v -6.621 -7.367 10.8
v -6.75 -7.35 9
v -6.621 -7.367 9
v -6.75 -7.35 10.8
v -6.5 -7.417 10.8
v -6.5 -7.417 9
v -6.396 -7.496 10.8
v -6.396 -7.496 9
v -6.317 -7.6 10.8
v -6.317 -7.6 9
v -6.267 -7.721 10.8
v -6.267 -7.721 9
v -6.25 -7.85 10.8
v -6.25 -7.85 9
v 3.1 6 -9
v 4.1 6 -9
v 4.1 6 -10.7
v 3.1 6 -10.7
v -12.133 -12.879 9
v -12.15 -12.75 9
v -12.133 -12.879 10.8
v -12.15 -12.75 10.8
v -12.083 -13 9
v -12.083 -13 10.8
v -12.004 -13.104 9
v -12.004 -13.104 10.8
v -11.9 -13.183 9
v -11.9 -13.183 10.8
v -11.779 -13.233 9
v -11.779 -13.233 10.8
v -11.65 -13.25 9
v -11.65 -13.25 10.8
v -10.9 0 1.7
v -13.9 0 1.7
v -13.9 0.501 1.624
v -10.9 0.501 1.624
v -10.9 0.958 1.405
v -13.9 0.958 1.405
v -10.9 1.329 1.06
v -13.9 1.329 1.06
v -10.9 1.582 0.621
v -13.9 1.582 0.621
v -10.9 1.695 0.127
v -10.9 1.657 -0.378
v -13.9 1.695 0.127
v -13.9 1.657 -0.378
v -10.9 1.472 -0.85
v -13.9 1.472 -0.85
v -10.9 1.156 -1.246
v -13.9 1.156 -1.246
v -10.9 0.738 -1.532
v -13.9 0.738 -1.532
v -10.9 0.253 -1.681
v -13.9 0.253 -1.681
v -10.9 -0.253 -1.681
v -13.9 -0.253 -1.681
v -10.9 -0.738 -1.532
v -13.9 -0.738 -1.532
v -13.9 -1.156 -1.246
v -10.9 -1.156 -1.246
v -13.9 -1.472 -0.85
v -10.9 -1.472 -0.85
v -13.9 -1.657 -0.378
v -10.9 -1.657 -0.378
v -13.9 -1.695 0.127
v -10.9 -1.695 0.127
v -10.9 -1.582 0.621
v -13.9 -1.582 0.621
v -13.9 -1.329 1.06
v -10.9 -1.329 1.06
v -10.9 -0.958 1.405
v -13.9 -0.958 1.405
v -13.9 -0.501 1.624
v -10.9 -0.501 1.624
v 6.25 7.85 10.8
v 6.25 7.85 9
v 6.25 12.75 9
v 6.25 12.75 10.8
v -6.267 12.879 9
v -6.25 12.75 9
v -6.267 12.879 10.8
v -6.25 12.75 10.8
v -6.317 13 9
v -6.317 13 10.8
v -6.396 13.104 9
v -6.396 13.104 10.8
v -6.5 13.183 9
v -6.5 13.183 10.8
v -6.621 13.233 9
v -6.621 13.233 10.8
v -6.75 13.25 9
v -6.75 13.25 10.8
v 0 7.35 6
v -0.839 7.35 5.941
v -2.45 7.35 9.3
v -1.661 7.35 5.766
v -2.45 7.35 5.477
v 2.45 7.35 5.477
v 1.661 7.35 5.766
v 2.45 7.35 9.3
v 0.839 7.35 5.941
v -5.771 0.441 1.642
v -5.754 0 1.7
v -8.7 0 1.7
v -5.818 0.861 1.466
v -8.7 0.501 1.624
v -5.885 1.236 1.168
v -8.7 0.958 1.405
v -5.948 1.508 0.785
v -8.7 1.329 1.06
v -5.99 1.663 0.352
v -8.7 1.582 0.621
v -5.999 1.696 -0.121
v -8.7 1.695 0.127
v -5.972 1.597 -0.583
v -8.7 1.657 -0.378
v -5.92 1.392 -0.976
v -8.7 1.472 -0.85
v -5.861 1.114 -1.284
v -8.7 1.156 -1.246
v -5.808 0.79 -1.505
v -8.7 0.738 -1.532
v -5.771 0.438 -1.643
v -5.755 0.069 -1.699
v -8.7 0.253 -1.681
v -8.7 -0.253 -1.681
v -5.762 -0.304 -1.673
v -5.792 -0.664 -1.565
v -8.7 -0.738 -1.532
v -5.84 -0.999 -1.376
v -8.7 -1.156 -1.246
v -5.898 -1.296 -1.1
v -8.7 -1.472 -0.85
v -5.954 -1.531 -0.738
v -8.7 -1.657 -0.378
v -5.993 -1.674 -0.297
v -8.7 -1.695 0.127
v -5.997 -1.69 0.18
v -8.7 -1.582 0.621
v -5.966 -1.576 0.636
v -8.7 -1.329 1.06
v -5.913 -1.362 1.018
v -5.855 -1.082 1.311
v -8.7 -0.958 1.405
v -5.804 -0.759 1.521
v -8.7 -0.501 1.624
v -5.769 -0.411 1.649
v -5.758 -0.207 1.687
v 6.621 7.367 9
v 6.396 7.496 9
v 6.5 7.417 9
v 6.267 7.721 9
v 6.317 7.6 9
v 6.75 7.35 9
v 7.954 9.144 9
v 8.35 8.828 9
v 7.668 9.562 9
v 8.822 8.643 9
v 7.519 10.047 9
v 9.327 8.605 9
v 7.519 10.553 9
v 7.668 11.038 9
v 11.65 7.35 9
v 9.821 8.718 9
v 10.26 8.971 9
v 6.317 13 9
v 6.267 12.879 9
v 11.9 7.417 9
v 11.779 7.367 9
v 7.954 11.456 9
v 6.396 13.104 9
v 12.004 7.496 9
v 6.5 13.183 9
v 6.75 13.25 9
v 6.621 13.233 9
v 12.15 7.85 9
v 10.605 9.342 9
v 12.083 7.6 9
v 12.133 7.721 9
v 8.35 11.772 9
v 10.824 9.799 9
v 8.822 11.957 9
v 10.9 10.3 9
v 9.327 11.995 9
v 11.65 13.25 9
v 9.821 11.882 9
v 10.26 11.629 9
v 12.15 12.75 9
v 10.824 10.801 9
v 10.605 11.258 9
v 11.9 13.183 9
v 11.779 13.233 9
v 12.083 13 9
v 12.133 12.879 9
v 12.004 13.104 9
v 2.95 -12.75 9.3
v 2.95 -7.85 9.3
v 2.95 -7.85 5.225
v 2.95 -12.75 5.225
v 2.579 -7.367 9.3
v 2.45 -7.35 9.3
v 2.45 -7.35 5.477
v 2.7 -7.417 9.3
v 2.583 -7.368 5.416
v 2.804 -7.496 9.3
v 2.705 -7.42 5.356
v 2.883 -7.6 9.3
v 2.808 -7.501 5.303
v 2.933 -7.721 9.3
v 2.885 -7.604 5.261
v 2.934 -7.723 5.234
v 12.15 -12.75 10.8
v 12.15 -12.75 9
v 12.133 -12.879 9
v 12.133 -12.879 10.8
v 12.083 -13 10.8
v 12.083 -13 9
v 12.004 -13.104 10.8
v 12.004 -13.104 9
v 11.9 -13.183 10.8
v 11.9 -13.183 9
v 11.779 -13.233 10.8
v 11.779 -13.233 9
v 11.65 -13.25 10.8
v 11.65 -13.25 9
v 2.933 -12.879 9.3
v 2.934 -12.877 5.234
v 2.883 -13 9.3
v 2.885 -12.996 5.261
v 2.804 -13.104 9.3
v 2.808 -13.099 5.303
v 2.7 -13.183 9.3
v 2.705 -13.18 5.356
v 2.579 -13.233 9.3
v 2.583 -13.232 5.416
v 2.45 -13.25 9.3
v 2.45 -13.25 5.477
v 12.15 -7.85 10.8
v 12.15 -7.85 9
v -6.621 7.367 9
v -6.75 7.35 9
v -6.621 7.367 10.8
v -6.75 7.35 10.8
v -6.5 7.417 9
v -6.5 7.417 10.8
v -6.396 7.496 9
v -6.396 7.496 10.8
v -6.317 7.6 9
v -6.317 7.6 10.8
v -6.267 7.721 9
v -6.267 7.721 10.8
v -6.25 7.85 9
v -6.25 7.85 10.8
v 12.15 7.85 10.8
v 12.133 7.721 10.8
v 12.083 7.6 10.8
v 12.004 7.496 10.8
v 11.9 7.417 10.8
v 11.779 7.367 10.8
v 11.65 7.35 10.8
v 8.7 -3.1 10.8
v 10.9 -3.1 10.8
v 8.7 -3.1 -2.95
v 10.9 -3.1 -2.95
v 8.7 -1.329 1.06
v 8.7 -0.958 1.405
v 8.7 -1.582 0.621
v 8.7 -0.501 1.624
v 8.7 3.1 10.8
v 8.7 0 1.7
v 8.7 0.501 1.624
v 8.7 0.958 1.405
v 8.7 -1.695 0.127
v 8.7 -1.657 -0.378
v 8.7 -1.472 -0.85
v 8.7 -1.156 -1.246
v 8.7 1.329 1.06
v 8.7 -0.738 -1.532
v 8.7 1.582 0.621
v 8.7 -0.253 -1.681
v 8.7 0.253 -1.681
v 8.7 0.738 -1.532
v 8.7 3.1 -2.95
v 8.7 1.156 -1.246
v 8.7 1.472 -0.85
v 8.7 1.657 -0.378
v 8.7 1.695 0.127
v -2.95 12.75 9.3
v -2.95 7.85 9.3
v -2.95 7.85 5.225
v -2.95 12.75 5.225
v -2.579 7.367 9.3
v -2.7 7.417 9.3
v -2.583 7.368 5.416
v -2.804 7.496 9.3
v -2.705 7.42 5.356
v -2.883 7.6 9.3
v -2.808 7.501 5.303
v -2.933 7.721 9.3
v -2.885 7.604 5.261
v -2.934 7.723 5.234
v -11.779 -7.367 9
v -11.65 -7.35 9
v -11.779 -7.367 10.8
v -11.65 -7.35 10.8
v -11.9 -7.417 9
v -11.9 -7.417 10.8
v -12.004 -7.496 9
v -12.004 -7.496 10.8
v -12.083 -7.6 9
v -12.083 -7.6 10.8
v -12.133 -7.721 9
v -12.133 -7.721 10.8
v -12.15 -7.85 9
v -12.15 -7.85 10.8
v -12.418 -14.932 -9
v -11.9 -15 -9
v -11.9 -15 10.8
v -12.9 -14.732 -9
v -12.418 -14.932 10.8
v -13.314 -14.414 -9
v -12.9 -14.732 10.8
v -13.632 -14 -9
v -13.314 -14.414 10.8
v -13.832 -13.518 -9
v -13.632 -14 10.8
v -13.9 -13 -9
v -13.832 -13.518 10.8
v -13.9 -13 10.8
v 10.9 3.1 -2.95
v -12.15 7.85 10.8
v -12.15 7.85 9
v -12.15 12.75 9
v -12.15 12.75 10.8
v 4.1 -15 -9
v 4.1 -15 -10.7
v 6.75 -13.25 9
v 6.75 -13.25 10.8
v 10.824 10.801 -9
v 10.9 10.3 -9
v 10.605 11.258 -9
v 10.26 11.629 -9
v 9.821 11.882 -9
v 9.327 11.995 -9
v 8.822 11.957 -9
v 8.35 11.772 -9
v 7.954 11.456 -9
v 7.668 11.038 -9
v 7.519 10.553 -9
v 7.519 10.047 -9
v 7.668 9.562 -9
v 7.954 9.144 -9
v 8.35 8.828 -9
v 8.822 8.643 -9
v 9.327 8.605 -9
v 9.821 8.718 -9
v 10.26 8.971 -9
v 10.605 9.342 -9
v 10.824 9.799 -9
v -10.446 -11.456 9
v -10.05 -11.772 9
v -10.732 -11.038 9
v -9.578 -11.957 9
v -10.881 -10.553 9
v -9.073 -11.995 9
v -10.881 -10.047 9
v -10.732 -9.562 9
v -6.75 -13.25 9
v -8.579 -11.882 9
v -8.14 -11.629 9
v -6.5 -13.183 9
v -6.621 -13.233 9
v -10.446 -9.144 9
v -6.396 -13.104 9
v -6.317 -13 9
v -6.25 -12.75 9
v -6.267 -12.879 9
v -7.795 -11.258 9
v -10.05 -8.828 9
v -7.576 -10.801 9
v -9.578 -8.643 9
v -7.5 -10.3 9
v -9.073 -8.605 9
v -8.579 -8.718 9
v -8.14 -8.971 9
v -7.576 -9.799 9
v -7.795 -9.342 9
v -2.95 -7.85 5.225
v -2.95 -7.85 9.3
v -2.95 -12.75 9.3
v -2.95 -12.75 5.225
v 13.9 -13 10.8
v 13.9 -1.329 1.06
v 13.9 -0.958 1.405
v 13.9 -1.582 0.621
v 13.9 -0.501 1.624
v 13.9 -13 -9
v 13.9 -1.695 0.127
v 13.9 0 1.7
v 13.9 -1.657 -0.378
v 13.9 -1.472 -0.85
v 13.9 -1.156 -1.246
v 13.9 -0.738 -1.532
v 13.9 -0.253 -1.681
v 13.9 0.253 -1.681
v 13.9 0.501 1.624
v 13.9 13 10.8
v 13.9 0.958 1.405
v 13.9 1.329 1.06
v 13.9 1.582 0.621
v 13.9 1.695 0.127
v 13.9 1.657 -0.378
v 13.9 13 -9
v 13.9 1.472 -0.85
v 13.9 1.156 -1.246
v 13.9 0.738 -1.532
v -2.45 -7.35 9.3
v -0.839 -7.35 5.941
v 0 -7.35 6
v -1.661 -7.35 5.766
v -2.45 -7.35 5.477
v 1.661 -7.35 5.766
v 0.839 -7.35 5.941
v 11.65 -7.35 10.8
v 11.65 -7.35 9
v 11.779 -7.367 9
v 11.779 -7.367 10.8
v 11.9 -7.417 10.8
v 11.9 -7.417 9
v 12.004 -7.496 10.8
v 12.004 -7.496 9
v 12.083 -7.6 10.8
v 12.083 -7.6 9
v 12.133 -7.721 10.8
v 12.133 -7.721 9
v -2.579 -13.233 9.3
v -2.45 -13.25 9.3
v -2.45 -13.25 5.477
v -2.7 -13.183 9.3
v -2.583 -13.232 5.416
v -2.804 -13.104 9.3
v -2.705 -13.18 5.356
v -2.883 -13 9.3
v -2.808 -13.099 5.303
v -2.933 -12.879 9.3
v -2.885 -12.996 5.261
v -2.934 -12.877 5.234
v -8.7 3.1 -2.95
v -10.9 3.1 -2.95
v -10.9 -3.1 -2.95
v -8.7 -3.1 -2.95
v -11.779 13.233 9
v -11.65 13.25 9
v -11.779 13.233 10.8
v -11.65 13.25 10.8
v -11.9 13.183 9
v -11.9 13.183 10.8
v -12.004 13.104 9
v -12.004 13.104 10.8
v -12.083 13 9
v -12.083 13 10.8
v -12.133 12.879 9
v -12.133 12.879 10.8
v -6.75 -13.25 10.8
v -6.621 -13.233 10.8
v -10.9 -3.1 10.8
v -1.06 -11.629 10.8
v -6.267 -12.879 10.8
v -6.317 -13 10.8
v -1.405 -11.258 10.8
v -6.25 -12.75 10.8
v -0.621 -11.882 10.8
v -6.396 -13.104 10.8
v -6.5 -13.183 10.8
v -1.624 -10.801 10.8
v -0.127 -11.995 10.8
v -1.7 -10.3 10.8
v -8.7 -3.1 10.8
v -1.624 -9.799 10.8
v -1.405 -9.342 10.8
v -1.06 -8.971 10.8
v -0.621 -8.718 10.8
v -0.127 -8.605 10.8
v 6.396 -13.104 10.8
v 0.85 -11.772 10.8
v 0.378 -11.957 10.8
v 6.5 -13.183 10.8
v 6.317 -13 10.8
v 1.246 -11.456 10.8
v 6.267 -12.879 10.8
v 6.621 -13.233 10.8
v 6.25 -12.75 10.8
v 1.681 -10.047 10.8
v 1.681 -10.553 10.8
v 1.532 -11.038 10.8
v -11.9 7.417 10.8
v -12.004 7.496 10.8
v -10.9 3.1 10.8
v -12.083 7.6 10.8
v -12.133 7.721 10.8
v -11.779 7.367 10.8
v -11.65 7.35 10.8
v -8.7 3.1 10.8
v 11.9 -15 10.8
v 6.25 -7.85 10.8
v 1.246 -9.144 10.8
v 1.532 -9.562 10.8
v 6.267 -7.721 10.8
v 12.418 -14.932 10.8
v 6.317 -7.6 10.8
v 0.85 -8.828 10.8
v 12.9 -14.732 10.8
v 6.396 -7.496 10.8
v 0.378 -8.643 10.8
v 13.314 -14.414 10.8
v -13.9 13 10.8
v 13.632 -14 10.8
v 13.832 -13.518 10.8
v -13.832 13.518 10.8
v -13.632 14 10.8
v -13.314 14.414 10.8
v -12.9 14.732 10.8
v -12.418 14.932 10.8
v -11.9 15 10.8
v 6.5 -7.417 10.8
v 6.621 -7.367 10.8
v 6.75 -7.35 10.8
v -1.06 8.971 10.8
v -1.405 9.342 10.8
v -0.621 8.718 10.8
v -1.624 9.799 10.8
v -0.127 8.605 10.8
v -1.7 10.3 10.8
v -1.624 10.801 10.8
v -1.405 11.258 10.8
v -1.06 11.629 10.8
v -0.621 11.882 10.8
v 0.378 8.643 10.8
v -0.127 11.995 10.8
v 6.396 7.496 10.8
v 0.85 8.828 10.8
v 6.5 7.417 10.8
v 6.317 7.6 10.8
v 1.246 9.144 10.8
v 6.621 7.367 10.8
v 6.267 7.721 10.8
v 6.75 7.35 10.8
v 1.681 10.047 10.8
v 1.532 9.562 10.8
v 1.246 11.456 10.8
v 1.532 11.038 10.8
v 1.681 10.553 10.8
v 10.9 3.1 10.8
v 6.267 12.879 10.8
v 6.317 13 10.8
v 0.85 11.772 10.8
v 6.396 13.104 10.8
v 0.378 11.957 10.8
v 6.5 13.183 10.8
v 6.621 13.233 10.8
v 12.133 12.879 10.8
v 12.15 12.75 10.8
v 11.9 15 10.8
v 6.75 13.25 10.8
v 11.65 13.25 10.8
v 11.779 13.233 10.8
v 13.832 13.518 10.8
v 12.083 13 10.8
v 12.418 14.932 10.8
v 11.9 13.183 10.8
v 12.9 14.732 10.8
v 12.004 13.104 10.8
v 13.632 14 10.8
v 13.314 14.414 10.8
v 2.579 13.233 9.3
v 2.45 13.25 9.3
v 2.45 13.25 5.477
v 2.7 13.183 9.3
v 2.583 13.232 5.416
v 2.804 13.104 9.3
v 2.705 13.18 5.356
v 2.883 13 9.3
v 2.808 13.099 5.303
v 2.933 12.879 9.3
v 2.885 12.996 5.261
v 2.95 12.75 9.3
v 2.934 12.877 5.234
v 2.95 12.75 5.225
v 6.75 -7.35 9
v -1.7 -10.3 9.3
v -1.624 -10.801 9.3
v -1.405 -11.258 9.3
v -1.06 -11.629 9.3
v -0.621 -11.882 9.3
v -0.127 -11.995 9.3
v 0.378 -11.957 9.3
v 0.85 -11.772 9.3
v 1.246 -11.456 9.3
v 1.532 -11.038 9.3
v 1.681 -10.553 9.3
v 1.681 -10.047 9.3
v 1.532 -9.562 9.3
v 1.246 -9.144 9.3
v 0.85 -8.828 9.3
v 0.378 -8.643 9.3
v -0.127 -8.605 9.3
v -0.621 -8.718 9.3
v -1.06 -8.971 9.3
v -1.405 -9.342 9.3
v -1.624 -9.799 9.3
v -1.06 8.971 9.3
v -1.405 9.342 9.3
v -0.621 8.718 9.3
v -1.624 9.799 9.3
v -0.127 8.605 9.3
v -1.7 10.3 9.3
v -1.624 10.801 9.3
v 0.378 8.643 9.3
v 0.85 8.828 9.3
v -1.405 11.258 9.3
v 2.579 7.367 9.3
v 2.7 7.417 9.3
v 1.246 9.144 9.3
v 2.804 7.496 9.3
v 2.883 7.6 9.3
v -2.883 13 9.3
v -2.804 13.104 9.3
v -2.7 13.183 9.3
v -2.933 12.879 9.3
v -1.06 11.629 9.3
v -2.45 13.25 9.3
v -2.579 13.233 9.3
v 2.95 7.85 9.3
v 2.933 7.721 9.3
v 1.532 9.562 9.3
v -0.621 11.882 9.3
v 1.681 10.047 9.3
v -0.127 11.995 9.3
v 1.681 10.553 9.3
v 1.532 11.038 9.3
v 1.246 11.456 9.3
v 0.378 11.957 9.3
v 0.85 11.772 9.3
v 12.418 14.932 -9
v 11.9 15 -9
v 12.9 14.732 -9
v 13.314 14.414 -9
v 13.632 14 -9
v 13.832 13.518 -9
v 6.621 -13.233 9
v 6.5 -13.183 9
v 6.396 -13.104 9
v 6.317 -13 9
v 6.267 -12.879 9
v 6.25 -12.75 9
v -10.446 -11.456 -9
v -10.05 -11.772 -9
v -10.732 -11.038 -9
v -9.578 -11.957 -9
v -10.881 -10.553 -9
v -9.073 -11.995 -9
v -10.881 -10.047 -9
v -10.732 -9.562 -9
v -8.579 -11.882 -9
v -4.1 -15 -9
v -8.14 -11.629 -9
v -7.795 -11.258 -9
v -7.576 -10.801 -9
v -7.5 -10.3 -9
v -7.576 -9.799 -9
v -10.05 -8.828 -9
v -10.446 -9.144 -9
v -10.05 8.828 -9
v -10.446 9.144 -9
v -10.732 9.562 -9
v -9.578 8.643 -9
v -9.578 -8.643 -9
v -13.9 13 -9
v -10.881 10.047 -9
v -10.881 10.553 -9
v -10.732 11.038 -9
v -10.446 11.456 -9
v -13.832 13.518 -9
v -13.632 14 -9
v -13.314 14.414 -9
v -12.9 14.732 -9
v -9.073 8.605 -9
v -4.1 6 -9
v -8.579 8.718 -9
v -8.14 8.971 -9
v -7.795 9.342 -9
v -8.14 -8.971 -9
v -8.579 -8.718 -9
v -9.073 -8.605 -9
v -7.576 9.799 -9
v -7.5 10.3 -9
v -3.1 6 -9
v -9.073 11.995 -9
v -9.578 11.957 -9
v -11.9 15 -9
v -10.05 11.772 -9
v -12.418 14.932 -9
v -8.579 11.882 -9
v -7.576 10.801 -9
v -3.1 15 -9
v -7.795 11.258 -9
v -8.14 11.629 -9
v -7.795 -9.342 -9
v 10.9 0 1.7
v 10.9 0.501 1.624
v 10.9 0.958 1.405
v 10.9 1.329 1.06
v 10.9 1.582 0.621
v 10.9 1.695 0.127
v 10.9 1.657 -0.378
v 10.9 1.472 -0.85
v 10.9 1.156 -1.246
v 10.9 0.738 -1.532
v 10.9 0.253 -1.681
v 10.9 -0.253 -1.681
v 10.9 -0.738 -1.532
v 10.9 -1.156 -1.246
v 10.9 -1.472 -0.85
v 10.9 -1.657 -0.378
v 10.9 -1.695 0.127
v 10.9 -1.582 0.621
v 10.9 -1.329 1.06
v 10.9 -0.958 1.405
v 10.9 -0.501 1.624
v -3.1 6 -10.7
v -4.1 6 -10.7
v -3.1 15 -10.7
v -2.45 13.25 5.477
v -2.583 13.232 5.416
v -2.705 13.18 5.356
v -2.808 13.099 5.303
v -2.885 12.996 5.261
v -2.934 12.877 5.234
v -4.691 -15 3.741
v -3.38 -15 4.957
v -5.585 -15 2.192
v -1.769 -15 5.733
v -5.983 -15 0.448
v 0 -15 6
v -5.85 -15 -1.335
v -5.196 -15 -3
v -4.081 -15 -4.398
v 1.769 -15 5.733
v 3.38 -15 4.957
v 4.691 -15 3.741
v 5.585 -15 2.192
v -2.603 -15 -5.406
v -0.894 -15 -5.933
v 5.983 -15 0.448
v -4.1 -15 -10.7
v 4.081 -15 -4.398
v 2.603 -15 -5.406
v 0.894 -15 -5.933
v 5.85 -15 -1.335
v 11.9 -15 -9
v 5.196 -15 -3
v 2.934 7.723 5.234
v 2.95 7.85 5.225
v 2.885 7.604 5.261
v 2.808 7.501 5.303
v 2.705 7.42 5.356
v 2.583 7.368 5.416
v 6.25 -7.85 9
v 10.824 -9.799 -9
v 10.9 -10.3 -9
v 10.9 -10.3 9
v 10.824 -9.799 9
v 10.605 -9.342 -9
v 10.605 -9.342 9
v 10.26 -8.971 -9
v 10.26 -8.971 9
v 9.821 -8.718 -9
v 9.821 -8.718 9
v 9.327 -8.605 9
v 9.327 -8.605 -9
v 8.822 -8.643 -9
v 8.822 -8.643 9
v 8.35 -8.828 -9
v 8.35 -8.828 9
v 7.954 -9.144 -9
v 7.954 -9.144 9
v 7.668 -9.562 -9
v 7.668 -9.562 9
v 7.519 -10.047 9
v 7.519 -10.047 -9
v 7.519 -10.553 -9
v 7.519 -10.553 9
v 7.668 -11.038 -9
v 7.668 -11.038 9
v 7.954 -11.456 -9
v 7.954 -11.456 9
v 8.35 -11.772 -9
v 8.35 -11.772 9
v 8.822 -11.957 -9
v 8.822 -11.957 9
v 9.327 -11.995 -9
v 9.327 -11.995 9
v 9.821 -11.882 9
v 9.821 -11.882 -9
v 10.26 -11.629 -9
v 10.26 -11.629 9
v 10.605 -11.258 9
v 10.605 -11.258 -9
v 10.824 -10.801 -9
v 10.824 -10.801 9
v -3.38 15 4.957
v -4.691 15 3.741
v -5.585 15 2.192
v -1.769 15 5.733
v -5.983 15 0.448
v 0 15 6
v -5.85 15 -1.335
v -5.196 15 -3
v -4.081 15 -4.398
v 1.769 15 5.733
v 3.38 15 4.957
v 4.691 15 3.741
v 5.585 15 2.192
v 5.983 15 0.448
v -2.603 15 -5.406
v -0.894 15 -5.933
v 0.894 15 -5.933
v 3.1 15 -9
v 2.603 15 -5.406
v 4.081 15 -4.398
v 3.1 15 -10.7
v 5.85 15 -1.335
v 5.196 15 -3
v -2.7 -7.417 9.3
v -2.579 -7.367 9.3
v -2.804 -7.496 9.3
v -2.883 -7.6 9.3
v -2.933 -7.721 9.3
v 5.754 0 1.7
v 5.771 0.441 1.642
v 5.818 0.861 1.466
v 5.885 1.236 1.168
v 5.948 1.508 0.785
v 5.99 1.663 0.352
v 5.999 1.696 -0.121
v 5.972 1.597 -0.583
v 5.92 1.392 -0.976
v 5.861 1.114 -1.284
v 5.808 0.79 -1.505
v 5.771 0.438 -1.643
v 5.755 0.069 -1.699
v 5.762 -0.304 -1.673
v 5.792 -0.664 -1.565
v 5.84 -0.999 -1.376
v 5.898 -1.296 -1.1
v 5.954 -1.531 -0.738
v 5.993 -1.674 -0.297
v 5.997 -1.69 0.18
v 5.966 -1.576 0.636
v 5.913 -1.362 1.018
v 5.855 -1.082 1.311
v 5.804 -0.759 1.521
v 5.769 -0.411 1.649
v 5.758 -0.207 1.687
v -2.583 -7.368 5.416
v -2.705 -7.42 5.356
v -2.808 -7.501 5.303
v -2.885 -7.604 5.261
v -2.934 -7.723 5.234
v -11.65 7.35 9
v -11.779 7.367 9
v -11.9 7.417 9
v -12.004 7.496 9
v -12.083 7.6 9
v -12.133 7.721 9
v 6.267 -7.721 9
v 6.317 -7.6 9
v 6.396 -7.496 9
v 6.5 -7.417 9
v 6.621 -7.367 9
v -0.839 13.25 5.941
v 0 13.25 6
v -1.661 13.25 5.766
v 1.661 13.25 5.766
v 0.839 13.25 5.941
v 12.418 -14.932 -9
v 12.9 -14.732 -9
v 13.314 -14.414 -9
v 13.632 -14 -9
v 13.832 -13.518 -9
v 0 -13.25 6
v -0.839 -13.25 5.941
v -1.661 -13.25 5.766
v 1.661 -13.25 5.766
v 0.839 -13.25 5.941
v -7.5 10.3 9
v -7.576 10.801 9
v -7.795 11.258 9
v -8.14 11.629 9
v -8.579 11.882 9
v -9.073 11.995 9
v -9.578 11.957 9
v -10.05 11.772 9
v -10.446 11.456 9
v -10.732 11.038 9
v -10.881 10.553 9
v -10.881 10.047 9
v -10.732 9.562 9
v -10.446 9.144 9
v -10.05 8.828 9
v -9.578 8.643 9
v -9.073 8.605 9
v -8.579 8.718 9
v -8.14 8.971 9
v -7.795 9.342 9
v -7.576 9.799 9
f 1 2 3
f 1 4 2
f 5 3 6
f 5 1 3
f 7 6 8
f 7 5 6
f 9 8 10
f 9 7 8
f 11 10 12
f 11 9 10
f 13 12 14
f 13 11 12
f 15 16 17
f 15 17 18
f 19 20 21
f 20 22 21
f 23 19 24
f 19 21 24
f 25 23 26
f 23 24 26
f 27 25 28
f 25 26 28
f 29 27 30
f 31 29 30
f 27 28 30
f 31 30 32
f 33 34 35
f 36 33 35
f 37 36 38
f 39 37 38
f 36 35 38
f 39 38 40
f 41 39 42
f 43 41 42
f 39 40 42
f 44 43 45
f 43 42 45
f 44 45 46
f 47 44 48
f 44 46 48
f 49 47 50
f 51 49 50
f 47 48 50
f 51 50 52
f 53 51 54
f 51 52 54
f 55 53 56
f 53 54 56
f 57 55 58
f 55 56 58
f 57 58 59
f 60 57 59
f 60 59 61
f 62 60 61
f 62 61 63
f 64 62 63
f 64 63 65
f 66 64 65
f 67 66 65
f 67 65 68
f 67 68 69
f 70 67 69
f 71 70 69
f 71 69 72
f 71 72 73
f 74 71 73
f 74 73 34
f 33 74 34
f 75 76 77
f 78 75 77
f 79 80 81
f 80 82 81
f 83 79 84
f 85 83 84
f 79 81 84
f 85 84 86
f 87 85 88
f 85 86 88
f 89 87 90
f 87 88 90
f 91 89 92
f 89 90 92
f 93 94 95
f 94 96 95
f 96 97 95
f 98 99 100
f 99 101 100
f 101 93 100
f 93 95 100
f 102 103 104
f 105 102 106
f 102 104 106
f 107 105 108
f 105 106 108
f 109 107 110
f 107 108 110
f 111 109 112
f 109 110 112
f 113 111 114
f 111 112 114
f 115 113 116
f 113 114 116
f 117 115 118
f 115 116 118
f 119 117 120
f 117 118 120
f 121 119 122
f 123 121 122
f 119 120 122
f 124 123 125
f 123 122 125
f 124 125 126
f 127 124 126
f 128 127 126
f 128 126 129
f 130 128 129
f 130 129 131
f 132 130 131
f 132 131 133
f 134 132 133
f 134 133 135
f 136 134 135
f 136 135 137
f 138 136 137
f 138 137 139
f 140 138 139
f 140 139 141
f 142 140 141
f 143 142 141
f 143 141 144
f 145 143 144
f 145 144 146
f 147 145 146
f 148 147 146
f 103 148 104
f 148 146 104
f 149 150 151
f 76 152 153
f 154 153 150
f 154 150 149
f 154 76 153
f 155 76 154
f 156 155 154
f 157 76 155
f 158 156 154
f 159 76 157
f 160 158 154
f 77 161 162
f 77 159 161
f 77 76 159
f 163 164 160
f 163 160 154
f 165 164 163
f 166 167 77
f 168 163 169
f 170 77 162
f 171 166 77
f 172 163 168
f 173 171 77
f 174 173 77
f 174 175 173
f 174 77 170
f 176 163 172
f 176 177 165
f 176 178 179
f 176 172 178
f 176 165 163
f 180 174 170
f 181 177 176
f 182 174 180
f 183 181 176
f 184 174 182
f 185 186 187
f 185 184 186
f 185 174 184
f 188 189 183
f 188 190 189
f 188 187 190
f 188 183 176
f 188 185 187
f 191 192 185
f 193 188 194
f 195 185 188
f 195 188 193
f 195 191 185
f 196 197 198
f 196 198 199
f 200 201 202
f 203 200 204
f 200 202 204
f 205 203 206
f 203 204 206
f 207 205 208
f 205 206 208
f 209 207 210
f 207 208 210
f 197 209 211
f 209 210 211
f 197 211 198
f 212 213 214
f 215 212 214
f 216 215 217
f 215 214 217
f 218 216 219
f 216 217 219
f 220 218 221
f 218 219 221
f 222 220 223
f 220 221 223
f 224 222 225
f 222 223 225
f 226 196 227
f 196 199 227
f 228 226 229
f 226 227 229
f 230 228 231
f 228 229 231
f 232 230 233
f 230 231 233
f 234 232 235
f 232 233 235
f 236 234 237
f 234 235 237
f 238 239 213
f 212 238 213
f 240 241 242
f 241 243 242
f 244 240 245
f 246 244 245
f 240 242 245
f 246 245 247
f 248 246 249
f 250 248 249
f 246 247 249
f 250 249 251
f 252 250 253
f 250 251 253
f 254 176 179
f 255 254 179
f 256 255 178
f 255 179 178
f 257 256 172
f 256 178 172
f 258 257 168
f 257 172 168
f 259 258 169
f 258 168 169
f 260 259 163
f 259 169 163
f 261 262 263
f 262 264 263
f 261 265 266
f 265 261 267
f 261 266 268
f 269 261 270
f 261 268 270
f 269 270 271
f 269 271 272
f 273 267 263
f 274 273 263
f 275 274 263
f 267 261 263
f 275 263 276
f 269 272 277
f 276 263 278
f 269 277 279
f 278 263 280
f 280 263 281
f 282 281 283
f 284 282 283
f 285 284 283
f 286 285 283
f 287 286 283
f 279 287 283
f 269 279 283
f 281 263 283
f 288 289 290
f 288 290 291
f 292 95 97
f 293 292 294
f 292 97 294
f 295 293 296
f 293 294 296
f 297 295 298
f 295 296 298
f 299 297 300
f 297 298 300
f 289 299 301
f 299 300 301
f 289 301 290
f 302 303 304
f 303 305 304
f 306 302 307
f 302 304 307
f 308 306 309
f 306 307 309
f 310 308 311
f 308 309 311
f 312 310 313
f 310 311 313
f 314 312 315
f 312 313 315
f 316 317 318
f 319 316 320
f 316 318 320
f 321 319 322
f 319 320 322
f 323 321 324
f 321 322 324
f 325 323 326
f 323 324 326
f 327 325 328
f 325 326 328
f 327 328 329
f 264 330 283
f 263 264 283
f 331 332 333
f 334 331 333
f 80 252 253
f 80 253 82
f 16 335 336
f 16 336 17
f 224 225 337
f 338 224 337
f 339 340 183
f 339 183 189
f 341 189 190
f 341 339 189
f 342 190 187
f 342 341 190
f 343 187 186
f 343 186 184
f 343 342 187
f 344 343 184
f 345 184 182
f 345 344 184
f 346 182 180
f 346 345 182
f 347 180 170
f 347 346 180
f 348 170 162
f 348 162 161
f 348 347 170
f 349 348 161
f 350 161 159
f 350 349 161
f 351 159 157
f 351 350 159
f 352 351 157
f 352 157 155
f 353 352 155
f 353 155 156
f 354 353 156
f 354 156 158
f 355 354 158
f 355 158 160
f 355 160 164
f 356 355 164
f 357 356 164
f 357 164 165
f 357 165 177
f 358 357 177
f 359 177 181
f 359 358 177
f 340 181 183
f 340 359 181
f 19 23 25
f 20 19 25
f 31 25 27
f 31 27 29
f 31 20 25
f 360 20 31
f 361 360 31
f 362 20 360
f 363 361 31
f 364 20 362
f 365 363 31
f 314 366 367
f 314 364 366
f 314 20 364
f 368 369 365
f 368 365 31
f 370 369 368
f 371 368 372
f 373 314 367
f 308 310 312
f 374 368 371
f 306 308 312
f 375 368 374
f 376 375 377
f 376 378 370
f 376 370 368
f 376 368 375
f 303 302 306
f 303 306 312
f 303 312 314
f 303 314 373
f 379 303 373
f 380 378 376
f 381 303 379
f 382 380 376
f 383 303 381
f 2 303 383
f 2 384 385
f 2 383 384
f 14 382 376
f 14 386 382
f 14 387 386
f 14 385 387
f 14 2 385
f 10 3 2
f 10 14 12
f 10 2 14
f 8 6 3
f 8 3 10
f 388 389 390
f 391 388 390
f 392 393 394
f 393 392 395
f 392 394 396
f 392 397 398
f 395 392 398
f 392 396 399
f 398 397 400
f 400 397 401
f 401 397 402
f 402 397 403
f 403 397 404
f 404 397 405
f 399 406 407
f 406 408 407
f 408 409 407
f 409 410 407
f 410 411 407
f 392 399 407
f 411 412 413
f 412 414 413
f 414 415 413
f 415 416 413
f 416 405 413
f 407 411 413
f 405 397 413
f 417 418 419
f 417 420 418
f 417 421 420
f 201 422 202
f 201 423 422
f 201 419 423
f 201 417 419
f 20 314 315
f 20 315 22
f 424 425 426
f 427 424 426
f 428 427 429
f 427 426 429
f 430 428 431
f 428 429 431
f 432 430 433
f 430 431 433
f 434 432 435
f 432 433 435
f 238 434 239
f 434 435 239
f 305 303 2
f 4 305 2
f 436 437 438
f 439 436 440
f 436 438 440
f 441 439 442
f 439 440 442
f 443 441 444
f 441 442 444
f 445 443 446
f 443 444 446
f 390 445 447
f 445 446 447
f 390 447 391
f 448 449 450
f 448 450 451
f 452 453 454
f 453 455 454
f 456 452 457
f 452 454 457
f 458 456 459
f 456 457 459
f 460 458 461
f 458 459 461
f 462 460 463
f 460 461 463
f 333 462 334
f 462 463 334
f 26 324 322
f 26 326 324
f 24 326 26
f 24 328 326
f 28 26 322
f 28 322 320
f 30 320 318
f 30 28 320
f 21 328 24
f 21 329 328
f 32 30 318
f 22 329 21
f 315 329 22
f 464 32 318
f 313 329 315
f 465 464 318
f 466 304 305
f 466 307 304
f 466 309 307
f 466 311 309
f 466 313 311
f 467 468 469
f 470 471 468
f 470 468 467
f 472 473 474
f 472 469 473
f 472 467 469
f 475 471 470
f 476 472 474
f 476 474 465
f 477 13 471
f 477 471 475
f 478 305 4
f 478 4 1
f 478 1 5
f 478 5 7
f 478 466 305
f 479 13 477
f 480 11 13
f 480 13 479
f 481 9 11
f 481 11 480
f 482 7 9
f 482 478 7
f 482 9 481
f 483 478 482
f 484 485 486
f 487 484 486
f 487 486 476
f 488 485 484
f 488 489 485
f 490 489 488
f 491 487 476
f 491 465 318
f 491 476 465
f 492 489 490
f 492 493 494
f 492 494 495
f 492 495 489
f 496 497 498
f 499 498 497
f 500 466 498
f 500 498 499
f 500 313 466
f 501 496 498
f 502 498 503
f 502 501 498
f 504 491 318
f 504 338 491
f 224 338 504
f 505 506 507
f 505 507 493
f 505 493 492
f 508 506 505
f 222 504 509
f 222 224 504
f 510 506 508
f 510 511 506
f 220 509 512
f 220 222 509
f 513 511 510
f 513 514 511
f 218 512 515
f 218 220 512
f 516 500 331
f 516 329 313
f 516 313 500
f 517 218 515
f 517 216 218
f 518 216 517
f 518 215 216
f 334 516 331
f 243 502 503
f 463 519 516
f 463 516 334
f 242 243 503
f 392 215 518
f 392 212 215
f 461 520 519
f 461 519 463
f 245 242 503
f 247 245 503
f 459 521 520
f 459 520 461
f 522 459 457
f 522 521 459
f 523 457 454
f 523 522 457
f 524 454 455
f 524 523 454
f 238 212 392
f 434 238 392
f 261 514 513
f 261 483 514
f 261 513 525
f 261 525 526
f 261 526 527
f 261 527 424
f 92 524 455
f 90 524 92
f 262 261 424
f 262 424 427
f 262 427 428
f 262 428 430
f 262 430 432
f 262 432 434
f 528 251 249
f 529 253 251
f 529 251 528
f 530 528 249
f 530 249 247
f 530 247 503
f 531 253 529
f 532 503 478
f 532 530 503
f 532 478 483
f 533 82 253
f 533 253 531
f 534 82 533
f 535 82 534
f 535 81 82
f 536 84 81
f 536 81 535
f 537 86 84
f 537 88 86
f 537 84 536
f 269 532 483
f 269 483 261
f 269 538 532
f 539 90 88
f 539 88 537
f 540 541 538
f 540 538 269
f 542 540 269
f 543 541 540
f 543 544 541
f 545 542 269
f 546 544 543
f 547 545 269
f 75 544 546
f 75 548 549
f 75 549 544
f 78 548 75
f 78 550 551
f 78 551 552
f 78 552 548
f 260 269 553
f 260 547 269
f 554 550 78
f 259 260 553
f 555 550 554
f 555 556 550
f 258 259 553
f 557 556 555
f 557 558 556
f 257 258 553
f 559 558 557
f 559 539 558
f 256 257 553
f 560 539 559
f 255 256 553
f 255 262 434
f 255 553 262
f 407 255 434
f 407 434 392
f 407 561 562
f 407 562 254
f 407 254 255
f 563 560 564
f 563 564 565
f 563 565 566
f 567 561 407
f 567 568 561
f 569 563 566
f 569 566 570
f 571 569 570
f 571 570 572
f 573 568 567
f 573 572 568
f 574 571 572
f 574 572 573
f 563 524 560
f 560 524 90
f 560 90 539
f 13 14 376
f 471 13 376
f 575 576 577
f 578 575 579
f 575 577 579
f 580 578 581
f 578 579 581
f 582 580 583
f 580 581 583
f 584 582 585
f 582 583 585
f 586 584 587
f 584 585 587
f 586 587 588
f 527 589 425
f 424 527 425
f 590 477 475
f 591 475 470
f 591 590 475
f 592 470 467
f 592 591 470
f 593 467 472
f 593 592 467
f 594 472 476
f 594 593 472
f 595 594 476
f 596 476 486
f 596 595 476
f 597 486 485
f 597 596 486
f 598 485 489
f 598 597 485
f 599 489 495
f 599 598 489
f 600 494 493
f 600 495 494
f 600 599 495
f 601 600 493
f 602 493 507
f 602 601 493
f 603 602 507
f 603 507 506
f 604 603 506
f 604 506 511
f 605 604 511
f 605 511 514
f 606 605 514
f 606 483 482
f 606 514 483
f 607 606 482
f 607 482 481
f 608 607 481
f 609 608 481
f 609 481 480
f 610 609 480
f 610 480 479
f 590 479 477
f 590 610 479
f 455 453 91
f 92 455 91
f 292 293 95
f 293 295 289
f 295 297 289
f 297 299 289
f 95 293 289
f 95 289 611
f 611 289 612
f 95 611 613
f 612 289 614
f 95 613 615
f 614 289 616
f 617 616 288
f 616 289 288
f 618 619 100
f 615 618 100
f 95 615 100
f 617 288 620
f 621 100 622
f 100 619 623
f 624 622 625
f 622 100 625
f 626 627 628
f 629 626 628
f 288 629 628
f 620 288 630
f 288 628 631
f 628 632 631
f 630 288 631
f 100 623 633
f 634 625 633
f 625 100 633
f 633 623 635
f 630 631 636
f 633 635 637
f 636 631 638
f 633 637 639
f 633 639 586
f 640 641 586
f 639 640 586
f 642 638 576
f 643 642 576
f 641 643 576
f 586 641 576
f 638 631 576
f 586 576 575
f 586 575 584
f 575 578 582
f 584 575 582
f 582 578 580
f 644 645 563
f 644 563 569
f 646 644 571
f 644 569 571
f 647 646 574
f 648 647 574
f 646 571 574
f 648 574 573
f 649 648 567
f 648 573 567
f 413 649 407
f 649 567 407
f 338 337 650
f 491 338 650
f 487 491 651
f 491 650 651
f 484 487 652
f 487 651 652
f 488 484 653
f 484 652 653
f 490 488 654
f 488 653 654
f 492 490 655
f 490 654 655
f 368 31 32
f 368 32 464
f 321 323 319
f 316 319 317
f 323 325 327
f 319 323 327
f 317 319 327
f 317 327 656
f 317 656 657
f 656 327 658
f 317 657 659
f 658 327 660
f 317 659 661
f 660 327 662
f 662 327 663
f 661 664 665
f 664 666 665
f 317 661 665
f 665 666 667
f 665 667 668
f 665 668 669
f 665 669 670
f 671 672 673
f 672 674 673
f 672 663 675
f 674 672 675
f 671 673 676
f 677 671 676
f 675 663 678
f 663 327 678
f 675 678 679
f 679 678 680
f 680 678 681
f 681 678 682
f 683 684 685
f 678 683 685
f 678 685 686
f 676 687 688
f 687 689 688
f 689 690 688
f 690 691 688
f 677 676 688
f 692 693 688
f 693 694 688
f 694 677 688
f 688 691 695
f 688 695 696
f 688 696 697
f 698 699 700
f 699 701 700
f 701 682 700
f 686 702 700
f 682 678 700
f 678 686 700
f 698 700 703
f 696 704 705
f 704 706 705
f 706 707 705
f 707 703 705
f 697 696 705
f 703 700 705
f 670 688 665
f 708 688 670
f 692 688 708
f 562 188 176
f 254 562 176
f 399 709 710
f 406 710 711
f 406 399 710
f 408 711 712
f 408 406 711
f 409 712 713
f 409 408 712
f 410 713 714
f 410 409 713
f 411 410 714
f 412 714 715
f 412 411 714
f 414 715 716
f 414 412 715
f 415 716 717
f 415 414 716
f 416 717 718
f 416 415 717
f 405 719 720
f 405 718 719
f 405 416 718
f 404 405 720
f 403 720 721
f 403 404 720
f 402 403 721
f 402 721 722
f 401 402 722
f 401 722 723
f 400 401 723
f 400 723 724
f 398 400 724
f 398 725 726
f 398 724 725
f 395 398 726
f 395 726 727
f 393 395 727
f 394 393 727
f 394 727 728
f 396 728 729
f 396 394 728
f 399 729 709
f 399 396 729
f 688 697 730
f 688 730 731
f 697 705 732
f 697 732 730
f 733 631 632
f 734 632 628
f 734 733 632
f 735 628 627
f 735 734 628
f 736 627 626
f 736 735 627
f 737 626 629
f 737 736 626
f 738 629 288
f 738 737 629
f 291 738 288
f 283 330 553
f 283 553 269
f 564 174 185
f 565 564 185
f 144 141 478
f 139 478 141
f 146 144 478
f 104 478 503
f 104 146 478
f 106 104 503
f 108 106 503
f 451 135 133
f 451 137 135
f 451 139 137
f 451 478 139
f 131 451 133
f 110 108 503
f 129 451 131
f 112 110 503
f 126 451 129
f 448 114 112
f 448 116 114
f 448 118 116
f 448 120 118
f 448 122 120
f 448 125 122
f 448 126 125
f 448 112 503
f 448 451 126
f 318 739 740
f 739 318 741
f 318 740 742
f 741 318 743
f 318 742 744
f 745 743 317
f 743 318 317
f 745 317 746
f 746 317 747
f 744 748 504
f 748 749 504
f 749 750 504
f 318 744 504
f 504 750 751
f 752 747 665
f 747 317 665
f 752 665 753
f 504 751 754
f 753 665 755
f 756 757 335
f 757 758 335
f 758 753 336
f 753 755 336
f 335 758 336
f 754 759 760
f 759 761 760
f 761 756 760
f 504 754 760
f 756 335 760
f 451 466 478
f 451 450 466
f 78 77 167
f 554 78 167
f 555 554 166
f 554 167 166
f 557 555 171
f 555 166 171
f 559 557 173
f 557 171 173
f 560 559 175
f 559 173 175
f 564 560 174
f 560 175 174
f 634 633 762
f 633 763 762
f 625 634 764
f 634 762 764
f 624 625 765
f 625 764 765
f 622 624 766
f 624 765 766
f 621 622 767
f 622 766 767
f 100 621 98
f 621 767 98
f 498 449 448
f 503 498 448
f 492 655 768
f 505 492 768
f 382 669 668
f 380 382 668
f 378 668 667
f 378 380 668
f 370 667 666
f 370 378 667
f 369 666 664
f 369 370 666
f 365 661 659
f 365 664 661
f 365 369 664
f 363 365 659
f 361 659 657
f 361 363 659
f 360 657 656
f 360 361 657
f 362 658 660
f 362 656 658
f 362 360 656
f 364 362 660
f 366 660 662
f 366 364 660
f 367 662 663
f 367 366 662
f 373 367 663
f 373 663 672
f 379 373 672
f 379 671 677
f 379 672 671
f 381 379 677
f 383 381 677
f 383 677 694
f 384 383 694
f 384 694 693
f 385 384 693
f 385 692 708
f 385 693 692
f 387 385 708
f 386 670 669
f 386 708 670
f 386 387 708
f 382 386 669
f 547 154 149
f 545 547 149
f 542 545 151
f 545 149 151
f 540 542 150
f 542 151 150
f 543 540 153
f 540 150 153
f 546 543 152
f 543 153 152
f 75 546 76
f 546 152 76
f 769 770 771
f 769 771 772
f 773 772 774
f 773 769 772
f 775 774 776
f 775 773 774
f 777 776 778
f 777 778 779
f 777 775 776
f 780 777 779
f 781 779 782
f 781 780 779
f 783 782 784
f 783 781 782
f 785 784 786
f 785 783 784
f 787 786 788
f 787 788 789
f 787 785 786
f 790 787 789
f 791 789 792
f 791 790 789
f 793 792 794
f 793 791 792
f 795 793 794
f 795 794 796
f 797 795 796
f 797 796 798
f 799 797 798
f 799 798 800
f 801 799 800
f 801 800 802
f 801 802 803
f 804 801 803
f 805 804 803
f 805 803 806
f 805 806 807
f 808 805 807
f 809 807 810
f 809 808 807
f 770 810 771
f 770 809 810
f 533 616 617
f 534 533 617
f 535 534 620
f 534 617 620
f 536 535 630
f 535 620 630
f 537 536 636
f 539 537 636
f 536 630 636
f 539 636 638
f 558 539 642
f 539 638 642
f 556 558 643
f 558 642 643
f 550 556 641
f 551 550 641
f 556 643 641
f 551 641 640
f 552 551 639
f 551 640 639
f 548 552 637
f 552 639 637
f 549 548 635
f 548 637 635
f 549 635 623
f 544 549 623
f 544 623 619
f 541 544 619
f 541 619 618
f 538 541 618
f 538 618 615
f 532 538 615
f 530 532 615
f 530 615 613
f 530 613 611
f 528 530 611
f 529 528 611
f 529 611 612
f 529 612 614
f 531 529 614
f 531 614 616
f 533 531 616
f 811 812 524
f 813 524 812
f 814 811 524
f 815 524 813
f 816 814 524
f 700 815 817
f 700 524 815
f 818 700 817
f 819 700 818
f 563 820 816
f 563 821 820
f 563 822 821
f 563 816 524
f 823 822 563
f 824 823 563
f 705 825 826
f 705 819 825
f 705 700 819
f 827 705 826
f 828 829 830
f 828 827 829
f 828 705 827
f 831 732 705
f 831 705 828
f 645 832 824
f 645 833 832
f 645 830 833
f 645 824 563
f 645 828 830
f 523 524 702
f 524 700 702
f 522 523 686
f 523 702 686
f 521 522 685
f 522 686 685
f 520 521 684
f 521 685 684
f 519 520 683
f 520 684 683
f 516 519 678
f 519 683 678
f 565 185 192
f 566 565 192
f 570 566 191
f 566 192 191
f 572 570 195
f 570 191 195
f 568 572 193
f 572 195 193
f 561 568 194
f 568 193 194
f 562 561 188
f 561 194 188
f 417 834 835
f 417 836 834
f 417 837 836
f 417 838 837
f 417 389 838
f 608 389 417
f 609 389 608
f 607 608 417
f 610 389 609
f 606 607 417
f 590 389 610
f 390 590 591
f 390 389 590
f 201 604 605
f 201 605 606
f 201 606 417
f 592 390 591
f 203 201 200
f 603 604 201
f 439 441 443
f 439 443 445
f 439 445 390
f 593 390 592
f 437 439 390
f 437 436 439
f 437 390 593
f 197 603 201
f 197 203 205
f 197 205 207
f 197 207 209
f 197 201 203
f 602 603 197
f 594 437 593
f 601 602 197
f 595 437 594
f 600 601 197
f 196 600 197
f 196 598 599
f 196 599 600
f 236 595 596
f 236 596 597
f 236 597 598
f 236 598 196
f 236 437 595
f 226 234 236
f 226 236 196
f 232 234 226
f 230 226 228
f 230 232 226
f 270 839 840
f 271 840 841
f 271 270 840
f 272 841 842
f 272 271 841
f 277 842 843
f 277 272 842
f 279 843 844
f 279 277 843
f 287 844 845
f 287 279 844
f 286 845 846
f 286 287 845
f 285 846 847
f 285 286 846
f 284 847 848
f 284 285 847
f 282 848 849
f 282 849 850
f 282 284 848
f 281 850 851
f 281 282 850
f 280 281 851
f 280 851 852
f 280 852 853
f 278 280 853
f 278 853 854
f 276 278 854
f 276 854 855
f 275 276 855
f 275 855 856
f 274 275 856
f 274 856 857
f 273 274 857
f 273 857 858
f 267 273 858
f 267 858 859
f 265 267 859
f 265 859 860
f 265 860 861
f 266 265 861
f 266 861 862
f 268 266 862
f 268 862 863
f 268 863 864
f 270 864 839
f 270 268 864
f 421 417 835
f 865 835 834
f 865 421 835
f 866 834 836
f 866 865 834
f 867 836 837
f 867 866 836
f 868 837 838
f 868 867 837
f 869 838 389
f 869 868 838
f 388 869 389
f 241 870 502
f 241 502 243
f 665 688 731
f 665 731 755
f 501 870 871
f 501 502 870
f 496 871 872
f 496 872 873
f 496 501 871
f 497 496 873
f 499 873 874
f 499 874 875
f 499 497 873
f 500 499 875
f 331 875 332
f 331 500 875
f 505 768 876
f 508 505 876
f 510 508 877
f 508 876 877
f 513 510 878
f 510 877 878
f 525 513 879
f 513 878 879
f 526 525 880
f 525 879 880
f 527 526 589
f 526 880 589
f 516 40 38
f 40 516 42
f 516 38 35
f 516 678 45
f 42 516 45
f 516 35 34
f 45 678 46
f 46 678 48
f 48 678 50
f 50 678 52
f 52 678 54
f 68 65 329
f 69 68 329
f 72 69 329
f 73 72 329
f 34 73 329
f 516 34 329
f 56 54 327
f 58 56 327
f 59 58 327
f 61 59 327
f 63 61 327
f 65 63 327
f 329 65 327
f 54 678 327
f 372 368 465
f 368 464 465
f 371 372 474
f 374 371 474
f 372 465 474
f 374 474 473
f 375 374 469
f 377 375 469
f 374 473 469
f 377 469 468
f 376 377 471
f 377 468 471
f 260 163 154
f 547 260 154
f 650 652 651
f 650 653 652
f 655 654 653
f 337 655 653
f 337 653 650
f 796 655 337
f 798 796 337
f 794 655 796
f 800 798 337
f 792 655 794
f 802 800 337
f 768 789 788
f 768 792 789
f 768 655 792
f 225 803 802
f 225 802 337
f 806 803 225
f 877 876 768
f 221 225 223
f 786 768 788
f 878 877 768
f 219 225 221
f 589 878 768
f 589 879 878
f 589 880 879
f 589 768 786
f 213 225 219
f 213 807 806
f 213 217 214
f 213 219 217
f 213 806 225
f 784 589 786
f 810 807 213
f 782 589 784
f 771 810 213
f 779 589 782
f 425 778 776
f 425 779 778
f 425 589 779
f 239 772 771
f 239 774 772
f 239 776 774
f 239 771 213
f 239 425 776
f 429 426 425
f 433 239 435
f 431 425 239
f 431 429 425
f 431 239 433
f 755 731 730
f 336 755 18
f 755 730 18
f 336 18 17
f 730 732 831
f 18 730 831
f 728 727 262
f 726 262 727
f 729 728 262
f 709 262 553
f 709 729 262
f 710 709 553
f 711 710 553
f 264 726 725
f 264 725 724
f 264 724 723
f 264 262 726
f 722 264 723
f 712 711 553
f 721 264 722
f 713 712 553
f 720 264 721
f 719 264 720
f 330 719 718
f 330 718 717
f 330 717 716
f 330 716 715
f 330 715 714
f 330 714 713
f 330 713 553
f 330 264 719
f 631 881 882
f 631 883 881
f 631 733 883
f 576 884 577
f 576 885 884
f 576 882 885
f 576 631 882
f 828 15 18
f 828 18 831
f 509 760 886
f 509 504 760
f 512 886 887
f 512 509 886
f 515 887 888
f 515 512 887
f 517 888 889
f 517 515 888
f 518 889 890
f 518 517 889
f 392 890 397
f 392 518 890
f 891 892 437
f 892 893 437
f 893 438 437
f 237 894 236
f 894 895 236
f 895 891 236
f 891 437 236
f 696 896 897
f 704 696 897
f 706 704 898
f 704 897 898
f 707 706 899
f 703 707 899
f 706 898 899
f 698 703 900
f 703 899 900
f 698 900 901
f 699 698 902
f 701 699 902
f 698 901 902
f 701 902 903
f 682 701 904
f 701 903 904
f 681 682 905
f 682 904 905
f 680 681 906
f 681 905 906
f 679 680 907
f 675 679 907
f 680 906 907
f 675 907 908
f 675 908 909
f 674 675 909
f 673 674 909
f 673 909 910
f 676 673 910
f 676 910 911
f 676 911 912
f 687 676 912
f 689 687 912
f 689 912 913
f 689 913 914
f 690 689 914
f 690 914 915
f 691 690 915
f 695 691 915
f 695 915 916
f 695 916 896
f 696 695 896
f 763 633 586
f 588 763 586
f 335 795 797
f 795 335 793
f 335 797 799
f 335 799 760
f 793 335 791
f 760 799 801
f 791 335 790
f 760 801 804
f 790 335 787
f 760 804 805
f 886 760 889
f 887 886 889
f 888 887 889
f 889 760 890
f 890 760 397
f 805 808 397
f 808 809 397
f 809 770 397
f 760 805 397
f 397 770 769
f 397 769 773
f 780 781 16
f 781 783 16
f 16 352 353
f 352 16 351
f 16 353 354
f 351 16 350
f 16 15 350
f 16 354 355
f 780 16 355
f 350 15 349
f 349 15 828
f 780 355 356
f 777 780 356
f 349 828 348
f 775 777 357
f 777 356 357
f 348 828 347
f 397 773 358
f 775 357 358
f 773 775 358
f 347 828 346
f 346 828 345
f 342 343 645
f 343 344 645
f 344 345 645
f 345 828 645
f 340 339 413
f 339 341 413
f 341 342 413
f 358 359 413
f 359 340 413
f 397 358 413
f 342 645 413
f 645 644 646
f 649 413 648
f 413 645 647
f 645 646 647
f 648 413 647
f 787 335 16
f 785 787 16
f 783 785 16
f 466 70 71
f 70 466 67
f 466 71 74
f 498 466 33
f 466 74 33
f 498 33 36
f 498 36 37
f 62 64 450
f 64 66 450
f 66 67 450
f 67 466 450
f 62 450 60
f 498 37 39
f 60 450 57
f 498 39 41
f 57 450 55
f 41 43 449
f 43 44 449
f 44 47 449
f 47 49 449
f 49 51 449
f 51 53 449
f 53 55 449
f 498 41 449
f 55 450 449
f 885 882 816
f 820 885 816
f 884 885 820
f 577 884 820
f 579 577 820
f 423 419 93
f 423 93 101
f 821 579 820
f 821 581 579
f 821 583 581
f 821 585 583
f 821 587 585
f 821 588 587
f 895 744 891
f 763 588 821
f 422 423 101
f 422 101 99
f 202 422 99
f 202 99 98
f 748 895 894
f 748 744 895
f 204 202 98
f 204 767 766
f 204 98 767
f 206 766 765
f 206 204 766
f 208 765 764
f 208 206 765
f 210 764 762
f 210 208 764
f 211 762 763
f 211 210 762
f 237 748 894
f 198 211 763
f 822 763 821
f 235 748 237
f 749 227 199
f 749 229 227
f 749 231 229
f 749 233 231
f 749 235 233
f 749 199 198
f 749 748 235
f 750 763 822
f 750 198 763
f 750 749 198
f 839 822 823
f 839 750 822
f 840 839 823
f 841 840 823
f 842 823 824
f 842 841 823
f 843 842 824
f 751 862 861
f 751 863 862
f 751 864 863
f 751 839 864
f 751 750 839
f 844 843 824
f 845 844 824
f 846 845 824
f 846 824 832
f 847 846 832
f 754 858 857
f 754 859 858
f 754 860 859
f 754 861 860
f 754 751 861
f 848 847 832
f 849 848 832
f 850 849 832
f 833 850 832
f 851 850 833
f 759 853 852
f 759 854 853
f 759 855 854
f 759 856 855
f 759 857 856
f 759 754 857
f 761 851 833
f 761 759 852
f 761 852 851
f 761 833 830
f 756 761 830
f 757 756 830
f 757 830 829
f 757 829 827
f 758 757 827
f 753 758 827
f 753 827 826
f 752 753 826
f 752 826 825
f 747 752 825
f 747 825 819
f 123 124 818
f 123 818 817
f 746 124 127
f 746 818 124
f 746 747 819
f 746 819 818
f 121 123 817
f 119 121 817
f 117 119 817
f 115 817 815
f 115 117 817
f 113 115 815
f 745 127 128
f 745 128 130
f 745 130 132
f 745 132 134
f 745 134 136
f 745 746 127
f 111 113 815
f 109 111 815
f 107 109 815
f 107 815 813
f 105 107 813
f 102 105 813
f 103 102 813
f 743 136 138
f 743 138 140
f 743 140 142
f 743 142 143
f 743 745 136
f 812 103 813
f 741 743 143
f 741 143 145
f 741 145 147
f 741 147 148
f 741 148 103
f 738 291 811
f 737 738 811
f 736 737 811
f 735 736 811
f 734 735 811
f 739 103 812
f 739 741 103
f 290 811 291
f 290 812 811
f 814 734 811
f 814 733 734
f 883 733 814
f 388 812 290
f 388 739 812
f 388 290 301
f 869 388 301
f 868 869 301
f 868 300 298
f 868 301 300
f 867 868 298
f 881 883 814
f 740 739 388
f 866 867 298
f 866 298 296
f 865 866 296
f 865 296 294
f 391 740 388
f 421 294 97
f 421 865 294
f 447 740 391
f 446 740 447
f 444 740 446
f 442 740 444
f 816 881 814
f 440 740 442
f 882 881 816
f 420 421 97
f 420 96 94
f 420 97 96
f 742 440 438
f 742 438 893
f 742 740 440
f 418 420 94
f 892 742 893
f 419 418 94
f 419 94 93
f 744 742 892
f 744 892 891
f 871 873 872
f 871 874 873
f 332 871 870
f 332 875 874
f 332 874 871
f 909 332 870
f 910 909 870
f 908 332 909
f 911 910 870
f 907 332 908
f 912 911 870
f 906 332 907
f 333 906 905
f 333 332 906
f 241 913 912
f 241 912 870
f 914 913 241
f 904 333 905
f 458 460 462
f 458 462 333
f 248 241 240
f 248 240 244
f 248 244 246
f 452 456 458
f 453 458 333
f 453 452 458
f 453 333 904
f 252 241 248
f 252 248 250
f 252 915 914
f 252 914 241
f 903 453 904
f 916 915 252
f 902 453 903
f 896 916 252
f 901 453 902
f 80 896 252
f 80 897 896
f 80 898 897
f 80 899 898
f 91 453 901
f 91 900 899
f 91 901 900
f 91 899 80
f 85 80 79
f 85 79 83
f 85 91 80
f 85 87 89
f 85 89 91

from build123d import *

# Parameters (mm, degrees)
SKETCH2_W               = 27.8
SKETCH2_H               = 18
SKETCH2_R               = 6
BOSS_EXTRUDE1_DEPTH     = 15
SKETCH7_W               = 13.9
SKETCH7_H               = 15
SKETCH7_W_2             = 5.9
SKETCH7_H_2             = 5.9
BOSS_EXTRUDE3_DEPTH     = 1.8
SKETCH8_R               = 1.7
CUT_EXTRUDE3_DEPTH      = 29.464890655
FILLET4_R               = 0.5
FILLET4_OF_MIRROR1_R    = 0.5
MIRROR2_START           = -9
MIRROR2_OUTLINE_R       = 1.7
MIRROR2_DEPTH           = 18
MIRROR2_START_2         = 9
MIRROR2_2_OUTLINE_W     = 13.9
MIRROR2_2_OUTLINE_H     = 30
MIRROR2_2_DEPTH         = 1.8
FILLET3_R               = 2
BOSS_EXTRUDE4_DEPTH     = 1.7
CUT_EXTRUDE4_REACH      = 33.173
CUT_EXTRUDE4_END_RADIUS = 6
CUT_EXTRUDE4_START      = -1.5
SKETCH10_W              = 5.9
SKETCH10_H              = 5.9
FILLET5_R               = 0.5
SKETCH11_R              = 1.7
CUT_EXTRUDE5_DEPTH      = 29.604370348
FILLET5_OF_MIRROR3_R    = 0.5
CUT_EXTRUDE6_START      = -10.8
SKETCH12_W              = 2.2
SKETCH12_H              = 6.2
CUT_EXTRUDE6_DEPTH      = 10.8
SKETCH13_W              = 2.2
SKETCH13_H              = 6.2
CUT_EXTRUDE7_DEPTH      = 2.95
CUT_EXTRUDE8_REACH      = 35.384
CUT_EXTRUDE8_END_RADIUS = 6
SKETCH14_R              = 1.7


# Read off the part's stored shape, not the designer's step: Mirror2
with BuildPart() as part:
    # Sketch2 → Boss-Extrude1 (new, symmetric)
    with BuildSketch(Plane(origin=(0, 0, 0), x_dir=(1, 0, 0), z_dir=(0, 1, 0))):
        Rectangle(SKETCH2_W, SKETCH2_H)
        with Locations(Location((0, 0, 0), (0, 0, 270))):
            Circle(SKETCH2_R, mode=Mode.SUBTRACT)
    extrude(amount=BOSS_EXTRUDE1_DEPTH, both=True)

    # Sketch7 → Boss-Extrude3 (add)
    with BuildSketch(Plane.XY.offset(9)):
        with Locations((-6.95, 7.5)):
            Rectangle(SKETCH7_W, SKETCH7_H)
        with Locations((-9.2, 10.3)):
            Rectangle(SKETCH7_W_2, SKETCH7_H_2, mode=Mode.SUBTRACT)
    boss_extrude3 = extrude(amount=BOSS_EXTRUDE3_DEPTH)

    # Sketch8 → Cut-Extrude3 (cut, through all)
    with BuildSketch(Plane.XY.offset(10.8)):
        with Locations((-9.2, 10.3)):
            Circle(SKETCH8_R)
    cut_extrude3 = extrude(amount=-CUT_EXTRUDE3_DEPTH, mode=Mode.SUBTRACT)

    # Fillet4
    fillet4_edges = [part.edges().sort_by_distance(p)[0] for p in [
        (-6.25, 13.25, 9.9),
        (-12.15, 13.25, 9.9),
        (-12.15, 7.35, 9.9),
        (-6.25, 7.35, 9.9),
    ]]
    fillet(fillet4_edges, radius=FILLET4_R)

    # Mirror1: Boss-Extrude3, Cut-Extrude3 across plane
    add(boss_extrude3.mirror(Plane.ZX))
    add(cut_extrude3.mirror(Plane.ZX), mode=Mode.SUBTRACT)

    # Fillet4 of Mirror1
    fillet4_of_mirror1_edges = [part.edges().sort_by_distance(p)[0] for p in [
        (-6.25, -13.25, 9.9),
        (-12.15, -13.25, 9.9),
        (-12.15, -7.35, 9.9),
        (-6.25, -7.35, 9.9),
    ]]
    fillet(fillet4_of_mirror1_edges, radius=FILLET4_OF_MIRROR1_R)

    # Mirror2 outline → Mirror2 (cut)
    with BuildSketch(Plane.XY.offset(MIRROR2_START)):
        with Locations((9.2, -10.3)):
            Circle(MIRROR2_OUTLINE_R)
        with Locations((9.2, 10.3)):
            Circle(MIRROR2_OUTLINE_R)
    extrude(amount=MIRROR2_DEPTH, mode=Mode.SUBTRACT)

    # Mirror2 2 outline → Mirror2 2 (add)
    with BuildSketch(Plane.XY.offset(MIRROR2_START_2)):
        with Locations((6.95, 0)):
            Rectangle(MIRROR2_2_OUTLINE_W, MIRROR2_2_OUTLINE_H)
        with BuildLine():
            ThreePointArc((6.25, -7.85), (6.396446609, -7.496446609), (6.75, -7.35))
            Line((6.75, -7.35), (11.65, -7.35))
            ThreePointArc((11.65, -7.35), (12.003553391, -7.496446609), (12.15, -7.85))
            Line((12.15, -7.85), (12.15, -12.75))
            ThreePointArc((12.15, -12.75), (12.003553391, -13.103553391), (11.65, -13.25))
            Line((11.65, -13.25), (6.75, -13.25))
            ThreePointArc((6.75, -13.25), (6.396446609, -13.103553391), (6.25, -12.75))
            Line((6.25, -12.75), (6.25, -7.85))
        make_face(mode=Mode.SUBTRACT)
        with BuildLine():
            Line((6.75, 13.25), (11.65, 13.25))
            ThreePointArc((11.65, 13.25), (12.003553391, 13.103553391), (12.15, 12.75))
            Line((12.15, 12.75), (12.15, 7.85))
            ThreePointArc((12.15, 7.85), (12.003553391, 7.496446609), (11.65, 7.35))
            Line((11.65, 7.35), (6.75, 7.35))
            ThreePointArc((6.75, 7.35), (6.396446609, 7.496446609), (6.25, 7.85))
            Line((6.25, 7.85), (6.25, 12.75))
            ThreePointArc((6.25, 12.75), (6.396446609, 13.103553391), (6.75, 13.25))
        make_face(mode=Mode.SUBTRACT)
    extrude(amount=MIRROR2_2_DEPTH)

    # Fillet3
    fillet3_edges = [part.edges().sort_by_distance(p)[0] for p in [
        (-13.9, 15, 0.9),
        (13.9, 15, 0.9),
        (-13.9, -15, 0.9),
        (13.9, -15, 0.9),
    ]]
    fillet(fillet3_edges, radius=FILLET3_R)

    # Sketch9 → Boss-Extrude4 (add)
    with BuildSketch(Plane(origin=(0, 0, -9), x_dir=(-1, 0, 0), z_dir=(0, 0, -1))):
        Polygon((-3.1, 15), (3.1, 15), (3.1, 6), (4.1, 6), (4.1, -15), (-4.1, -15), (-4.1, 6), (-3.1, 6), align=None)
    extrude(amount=BOSS_EXTRUDE4_DEPTH)

    # Cut-Extrude4: up to this cylinder (the profile starts outside it)
    cut_extrude4_end = Plane(origin=(0, 10.3, 0), z_dir=(0, -1, 0)) * Cylinder(CUT_EXTRUDE4_END_RADIUS, 79.346, mode=Mode.PRIVATE)
    # Sketch10 → Cut-Extrude4 (cut, up to the surface)
    with BuildSketch(Plane.XY.offset(10.8).offset(CUT_EXTRUDE4_START), mode=Mode.PRIVATE) as cut_extrude4_sk1:
        with Locations((0, 10.3)):
            Rectangle(SKETCH10_W, SKETCH10_H)
    cut_extrude4_tool1 = extrude(cut_extrude4_sk1.sketch, amount=-CUT_EXTRUDE4_REACH, mode=Mode.PRIVATE) - cut_extrude4_end
    cut_extrude4 = cut_extrude4_tool1.solids().sort_by_distance((0, 10.3, 9.3))[0]
    add(cut_extrude4, mode=Mode.SUBTRACT)

    # Fillet5
    fillet5_edges = [part.edges().sort_by_distance(p)[0] for p in [
        (2.95, 13.25, 7.262350474),
        (2.95, 7.35, 7.262350474),
        (-2.95, 7.35, 7.262350474),
        (-2.95, 13.25, 7.262350474),
    ]]
    fillet(fillet5_edges, radius=FILLET5_R)

    # Sketch11 → Cut-Extrude5 (cut, through all)
    with BuildSketch(Plane(origin=(0, 0, 9.3), x_dir=(-1, 0, 0), z_dir=(0, 0, -1))):
        with Locations((0, 10.3)):
            Circle(SKETCH11_R)
    cut_extrude5 = extrude(amount=-CUT_EXTRUDE5_DEPTH, mode=Mode.SUBTRACT)

    # Mirror3: Cut-Extrude4, Cut-Extrude5 across plane
    add(cut_extrude4.mirror(Plane.ZX), mode=Mode.SUBTRACT)
    add(cut_extrude5.mirror(Plane.ZX), mode=Mode.SUBTRACT)

    # Fillet5 of Mirror3
    fillet5_of_mirror3_edges = [part.edges().sort_by_distance(p)[0] for p in [
        (2.95, -13.25, 7.262350474),
        (2.95, -7.35, 7.262350474),
        (-2.95, -7.35, 7.262350474),
        (-2.95, -13.25, 7.262350474),
    ]]
    fillet(fillet5_of_mirror3_edges, radius=FILLET5_OF_MIRROR3_R)

    # Sketch12 → Cut-Extrude6 (cut)
    with BuildSketch(Plane.XY.offset(10.8).offset(CUT_EXTRUDE6_START)):
        with Locations((-9.8, 0)):
            Rectangle(SKETCH12_W, SKETCH12_H)
    cut_extrude6 = extrude(amount=CUT_EXTRUDE6_DEPTH, mode=Mode.SUBTRACT)

    # Sketch13 → Cut-Extrude7 (cut)
    with BuildSketch(Plane.XY):
        with Locations((-9.8, 0)):
            Rectangle(SKETCH13_W, SKETCH13_H)
    cut_extrude7 = extrude(amount=-CUT_EXTRUDE7_DEPTH, mode=Mode.SUBTRACT)

    # Cut-Extrude8: up to this cylinder (the profile starts outside it)
    cut_extrude8_end = Plane(origin=(0, 0, 0), z_dir=(0, -1, 0)) * Cylinder(CUT_EXTRUDE8_END_RADIUS, 83.768, mode=Mode.PRIVATE)
    # Sketch14 → Cut-Extrude8 (cut, up to the surface)
    with BuildSketch(Plane.ZY.offset(13.9), mode=Mode.PRIVATE) as cut_extrude8_sk1:
        Circle(SKETCH14_R)
    cut_extrude8_tool1 = extrude(cut_extrude8_sk1.sketch, amount=-CUT_EXTRUDE8_REACH, mode=Mode.PRIVATE) - cut_extrude8_end
    cut_extrude8 = cut_extrude8_tool1.solids().sort_by_distance((-13.9, 0, 0))[0]
    add(cut_extrude8, mode=Mode.SUBTRACT)

    # Mirror4: Cut-Extrude6, Cut-Extrude7, Cut-Extrude8 across plane
    add(cut_extrude6.mirror(Plane(origin=(0, 0, 0), x_dir=(0, 0, 1), z_dir=(1, 0, 0))), mode=Mode.SUBTRACT)
    add(cut_extrude7.mirror(Plane(origin=(0, 0, 0), x_dir=(0, 0, 1), z_dir=(1, 0, 0))), mode=Mode.SUBTRACT)
    add(cut_extrude8.mirror(Plane(origin=(0, 0, 0), x_dir=(0, 0, 1), z_dir=(1, 0, 0))), mode=Mode.SUBTRACT)


solid = part.part
